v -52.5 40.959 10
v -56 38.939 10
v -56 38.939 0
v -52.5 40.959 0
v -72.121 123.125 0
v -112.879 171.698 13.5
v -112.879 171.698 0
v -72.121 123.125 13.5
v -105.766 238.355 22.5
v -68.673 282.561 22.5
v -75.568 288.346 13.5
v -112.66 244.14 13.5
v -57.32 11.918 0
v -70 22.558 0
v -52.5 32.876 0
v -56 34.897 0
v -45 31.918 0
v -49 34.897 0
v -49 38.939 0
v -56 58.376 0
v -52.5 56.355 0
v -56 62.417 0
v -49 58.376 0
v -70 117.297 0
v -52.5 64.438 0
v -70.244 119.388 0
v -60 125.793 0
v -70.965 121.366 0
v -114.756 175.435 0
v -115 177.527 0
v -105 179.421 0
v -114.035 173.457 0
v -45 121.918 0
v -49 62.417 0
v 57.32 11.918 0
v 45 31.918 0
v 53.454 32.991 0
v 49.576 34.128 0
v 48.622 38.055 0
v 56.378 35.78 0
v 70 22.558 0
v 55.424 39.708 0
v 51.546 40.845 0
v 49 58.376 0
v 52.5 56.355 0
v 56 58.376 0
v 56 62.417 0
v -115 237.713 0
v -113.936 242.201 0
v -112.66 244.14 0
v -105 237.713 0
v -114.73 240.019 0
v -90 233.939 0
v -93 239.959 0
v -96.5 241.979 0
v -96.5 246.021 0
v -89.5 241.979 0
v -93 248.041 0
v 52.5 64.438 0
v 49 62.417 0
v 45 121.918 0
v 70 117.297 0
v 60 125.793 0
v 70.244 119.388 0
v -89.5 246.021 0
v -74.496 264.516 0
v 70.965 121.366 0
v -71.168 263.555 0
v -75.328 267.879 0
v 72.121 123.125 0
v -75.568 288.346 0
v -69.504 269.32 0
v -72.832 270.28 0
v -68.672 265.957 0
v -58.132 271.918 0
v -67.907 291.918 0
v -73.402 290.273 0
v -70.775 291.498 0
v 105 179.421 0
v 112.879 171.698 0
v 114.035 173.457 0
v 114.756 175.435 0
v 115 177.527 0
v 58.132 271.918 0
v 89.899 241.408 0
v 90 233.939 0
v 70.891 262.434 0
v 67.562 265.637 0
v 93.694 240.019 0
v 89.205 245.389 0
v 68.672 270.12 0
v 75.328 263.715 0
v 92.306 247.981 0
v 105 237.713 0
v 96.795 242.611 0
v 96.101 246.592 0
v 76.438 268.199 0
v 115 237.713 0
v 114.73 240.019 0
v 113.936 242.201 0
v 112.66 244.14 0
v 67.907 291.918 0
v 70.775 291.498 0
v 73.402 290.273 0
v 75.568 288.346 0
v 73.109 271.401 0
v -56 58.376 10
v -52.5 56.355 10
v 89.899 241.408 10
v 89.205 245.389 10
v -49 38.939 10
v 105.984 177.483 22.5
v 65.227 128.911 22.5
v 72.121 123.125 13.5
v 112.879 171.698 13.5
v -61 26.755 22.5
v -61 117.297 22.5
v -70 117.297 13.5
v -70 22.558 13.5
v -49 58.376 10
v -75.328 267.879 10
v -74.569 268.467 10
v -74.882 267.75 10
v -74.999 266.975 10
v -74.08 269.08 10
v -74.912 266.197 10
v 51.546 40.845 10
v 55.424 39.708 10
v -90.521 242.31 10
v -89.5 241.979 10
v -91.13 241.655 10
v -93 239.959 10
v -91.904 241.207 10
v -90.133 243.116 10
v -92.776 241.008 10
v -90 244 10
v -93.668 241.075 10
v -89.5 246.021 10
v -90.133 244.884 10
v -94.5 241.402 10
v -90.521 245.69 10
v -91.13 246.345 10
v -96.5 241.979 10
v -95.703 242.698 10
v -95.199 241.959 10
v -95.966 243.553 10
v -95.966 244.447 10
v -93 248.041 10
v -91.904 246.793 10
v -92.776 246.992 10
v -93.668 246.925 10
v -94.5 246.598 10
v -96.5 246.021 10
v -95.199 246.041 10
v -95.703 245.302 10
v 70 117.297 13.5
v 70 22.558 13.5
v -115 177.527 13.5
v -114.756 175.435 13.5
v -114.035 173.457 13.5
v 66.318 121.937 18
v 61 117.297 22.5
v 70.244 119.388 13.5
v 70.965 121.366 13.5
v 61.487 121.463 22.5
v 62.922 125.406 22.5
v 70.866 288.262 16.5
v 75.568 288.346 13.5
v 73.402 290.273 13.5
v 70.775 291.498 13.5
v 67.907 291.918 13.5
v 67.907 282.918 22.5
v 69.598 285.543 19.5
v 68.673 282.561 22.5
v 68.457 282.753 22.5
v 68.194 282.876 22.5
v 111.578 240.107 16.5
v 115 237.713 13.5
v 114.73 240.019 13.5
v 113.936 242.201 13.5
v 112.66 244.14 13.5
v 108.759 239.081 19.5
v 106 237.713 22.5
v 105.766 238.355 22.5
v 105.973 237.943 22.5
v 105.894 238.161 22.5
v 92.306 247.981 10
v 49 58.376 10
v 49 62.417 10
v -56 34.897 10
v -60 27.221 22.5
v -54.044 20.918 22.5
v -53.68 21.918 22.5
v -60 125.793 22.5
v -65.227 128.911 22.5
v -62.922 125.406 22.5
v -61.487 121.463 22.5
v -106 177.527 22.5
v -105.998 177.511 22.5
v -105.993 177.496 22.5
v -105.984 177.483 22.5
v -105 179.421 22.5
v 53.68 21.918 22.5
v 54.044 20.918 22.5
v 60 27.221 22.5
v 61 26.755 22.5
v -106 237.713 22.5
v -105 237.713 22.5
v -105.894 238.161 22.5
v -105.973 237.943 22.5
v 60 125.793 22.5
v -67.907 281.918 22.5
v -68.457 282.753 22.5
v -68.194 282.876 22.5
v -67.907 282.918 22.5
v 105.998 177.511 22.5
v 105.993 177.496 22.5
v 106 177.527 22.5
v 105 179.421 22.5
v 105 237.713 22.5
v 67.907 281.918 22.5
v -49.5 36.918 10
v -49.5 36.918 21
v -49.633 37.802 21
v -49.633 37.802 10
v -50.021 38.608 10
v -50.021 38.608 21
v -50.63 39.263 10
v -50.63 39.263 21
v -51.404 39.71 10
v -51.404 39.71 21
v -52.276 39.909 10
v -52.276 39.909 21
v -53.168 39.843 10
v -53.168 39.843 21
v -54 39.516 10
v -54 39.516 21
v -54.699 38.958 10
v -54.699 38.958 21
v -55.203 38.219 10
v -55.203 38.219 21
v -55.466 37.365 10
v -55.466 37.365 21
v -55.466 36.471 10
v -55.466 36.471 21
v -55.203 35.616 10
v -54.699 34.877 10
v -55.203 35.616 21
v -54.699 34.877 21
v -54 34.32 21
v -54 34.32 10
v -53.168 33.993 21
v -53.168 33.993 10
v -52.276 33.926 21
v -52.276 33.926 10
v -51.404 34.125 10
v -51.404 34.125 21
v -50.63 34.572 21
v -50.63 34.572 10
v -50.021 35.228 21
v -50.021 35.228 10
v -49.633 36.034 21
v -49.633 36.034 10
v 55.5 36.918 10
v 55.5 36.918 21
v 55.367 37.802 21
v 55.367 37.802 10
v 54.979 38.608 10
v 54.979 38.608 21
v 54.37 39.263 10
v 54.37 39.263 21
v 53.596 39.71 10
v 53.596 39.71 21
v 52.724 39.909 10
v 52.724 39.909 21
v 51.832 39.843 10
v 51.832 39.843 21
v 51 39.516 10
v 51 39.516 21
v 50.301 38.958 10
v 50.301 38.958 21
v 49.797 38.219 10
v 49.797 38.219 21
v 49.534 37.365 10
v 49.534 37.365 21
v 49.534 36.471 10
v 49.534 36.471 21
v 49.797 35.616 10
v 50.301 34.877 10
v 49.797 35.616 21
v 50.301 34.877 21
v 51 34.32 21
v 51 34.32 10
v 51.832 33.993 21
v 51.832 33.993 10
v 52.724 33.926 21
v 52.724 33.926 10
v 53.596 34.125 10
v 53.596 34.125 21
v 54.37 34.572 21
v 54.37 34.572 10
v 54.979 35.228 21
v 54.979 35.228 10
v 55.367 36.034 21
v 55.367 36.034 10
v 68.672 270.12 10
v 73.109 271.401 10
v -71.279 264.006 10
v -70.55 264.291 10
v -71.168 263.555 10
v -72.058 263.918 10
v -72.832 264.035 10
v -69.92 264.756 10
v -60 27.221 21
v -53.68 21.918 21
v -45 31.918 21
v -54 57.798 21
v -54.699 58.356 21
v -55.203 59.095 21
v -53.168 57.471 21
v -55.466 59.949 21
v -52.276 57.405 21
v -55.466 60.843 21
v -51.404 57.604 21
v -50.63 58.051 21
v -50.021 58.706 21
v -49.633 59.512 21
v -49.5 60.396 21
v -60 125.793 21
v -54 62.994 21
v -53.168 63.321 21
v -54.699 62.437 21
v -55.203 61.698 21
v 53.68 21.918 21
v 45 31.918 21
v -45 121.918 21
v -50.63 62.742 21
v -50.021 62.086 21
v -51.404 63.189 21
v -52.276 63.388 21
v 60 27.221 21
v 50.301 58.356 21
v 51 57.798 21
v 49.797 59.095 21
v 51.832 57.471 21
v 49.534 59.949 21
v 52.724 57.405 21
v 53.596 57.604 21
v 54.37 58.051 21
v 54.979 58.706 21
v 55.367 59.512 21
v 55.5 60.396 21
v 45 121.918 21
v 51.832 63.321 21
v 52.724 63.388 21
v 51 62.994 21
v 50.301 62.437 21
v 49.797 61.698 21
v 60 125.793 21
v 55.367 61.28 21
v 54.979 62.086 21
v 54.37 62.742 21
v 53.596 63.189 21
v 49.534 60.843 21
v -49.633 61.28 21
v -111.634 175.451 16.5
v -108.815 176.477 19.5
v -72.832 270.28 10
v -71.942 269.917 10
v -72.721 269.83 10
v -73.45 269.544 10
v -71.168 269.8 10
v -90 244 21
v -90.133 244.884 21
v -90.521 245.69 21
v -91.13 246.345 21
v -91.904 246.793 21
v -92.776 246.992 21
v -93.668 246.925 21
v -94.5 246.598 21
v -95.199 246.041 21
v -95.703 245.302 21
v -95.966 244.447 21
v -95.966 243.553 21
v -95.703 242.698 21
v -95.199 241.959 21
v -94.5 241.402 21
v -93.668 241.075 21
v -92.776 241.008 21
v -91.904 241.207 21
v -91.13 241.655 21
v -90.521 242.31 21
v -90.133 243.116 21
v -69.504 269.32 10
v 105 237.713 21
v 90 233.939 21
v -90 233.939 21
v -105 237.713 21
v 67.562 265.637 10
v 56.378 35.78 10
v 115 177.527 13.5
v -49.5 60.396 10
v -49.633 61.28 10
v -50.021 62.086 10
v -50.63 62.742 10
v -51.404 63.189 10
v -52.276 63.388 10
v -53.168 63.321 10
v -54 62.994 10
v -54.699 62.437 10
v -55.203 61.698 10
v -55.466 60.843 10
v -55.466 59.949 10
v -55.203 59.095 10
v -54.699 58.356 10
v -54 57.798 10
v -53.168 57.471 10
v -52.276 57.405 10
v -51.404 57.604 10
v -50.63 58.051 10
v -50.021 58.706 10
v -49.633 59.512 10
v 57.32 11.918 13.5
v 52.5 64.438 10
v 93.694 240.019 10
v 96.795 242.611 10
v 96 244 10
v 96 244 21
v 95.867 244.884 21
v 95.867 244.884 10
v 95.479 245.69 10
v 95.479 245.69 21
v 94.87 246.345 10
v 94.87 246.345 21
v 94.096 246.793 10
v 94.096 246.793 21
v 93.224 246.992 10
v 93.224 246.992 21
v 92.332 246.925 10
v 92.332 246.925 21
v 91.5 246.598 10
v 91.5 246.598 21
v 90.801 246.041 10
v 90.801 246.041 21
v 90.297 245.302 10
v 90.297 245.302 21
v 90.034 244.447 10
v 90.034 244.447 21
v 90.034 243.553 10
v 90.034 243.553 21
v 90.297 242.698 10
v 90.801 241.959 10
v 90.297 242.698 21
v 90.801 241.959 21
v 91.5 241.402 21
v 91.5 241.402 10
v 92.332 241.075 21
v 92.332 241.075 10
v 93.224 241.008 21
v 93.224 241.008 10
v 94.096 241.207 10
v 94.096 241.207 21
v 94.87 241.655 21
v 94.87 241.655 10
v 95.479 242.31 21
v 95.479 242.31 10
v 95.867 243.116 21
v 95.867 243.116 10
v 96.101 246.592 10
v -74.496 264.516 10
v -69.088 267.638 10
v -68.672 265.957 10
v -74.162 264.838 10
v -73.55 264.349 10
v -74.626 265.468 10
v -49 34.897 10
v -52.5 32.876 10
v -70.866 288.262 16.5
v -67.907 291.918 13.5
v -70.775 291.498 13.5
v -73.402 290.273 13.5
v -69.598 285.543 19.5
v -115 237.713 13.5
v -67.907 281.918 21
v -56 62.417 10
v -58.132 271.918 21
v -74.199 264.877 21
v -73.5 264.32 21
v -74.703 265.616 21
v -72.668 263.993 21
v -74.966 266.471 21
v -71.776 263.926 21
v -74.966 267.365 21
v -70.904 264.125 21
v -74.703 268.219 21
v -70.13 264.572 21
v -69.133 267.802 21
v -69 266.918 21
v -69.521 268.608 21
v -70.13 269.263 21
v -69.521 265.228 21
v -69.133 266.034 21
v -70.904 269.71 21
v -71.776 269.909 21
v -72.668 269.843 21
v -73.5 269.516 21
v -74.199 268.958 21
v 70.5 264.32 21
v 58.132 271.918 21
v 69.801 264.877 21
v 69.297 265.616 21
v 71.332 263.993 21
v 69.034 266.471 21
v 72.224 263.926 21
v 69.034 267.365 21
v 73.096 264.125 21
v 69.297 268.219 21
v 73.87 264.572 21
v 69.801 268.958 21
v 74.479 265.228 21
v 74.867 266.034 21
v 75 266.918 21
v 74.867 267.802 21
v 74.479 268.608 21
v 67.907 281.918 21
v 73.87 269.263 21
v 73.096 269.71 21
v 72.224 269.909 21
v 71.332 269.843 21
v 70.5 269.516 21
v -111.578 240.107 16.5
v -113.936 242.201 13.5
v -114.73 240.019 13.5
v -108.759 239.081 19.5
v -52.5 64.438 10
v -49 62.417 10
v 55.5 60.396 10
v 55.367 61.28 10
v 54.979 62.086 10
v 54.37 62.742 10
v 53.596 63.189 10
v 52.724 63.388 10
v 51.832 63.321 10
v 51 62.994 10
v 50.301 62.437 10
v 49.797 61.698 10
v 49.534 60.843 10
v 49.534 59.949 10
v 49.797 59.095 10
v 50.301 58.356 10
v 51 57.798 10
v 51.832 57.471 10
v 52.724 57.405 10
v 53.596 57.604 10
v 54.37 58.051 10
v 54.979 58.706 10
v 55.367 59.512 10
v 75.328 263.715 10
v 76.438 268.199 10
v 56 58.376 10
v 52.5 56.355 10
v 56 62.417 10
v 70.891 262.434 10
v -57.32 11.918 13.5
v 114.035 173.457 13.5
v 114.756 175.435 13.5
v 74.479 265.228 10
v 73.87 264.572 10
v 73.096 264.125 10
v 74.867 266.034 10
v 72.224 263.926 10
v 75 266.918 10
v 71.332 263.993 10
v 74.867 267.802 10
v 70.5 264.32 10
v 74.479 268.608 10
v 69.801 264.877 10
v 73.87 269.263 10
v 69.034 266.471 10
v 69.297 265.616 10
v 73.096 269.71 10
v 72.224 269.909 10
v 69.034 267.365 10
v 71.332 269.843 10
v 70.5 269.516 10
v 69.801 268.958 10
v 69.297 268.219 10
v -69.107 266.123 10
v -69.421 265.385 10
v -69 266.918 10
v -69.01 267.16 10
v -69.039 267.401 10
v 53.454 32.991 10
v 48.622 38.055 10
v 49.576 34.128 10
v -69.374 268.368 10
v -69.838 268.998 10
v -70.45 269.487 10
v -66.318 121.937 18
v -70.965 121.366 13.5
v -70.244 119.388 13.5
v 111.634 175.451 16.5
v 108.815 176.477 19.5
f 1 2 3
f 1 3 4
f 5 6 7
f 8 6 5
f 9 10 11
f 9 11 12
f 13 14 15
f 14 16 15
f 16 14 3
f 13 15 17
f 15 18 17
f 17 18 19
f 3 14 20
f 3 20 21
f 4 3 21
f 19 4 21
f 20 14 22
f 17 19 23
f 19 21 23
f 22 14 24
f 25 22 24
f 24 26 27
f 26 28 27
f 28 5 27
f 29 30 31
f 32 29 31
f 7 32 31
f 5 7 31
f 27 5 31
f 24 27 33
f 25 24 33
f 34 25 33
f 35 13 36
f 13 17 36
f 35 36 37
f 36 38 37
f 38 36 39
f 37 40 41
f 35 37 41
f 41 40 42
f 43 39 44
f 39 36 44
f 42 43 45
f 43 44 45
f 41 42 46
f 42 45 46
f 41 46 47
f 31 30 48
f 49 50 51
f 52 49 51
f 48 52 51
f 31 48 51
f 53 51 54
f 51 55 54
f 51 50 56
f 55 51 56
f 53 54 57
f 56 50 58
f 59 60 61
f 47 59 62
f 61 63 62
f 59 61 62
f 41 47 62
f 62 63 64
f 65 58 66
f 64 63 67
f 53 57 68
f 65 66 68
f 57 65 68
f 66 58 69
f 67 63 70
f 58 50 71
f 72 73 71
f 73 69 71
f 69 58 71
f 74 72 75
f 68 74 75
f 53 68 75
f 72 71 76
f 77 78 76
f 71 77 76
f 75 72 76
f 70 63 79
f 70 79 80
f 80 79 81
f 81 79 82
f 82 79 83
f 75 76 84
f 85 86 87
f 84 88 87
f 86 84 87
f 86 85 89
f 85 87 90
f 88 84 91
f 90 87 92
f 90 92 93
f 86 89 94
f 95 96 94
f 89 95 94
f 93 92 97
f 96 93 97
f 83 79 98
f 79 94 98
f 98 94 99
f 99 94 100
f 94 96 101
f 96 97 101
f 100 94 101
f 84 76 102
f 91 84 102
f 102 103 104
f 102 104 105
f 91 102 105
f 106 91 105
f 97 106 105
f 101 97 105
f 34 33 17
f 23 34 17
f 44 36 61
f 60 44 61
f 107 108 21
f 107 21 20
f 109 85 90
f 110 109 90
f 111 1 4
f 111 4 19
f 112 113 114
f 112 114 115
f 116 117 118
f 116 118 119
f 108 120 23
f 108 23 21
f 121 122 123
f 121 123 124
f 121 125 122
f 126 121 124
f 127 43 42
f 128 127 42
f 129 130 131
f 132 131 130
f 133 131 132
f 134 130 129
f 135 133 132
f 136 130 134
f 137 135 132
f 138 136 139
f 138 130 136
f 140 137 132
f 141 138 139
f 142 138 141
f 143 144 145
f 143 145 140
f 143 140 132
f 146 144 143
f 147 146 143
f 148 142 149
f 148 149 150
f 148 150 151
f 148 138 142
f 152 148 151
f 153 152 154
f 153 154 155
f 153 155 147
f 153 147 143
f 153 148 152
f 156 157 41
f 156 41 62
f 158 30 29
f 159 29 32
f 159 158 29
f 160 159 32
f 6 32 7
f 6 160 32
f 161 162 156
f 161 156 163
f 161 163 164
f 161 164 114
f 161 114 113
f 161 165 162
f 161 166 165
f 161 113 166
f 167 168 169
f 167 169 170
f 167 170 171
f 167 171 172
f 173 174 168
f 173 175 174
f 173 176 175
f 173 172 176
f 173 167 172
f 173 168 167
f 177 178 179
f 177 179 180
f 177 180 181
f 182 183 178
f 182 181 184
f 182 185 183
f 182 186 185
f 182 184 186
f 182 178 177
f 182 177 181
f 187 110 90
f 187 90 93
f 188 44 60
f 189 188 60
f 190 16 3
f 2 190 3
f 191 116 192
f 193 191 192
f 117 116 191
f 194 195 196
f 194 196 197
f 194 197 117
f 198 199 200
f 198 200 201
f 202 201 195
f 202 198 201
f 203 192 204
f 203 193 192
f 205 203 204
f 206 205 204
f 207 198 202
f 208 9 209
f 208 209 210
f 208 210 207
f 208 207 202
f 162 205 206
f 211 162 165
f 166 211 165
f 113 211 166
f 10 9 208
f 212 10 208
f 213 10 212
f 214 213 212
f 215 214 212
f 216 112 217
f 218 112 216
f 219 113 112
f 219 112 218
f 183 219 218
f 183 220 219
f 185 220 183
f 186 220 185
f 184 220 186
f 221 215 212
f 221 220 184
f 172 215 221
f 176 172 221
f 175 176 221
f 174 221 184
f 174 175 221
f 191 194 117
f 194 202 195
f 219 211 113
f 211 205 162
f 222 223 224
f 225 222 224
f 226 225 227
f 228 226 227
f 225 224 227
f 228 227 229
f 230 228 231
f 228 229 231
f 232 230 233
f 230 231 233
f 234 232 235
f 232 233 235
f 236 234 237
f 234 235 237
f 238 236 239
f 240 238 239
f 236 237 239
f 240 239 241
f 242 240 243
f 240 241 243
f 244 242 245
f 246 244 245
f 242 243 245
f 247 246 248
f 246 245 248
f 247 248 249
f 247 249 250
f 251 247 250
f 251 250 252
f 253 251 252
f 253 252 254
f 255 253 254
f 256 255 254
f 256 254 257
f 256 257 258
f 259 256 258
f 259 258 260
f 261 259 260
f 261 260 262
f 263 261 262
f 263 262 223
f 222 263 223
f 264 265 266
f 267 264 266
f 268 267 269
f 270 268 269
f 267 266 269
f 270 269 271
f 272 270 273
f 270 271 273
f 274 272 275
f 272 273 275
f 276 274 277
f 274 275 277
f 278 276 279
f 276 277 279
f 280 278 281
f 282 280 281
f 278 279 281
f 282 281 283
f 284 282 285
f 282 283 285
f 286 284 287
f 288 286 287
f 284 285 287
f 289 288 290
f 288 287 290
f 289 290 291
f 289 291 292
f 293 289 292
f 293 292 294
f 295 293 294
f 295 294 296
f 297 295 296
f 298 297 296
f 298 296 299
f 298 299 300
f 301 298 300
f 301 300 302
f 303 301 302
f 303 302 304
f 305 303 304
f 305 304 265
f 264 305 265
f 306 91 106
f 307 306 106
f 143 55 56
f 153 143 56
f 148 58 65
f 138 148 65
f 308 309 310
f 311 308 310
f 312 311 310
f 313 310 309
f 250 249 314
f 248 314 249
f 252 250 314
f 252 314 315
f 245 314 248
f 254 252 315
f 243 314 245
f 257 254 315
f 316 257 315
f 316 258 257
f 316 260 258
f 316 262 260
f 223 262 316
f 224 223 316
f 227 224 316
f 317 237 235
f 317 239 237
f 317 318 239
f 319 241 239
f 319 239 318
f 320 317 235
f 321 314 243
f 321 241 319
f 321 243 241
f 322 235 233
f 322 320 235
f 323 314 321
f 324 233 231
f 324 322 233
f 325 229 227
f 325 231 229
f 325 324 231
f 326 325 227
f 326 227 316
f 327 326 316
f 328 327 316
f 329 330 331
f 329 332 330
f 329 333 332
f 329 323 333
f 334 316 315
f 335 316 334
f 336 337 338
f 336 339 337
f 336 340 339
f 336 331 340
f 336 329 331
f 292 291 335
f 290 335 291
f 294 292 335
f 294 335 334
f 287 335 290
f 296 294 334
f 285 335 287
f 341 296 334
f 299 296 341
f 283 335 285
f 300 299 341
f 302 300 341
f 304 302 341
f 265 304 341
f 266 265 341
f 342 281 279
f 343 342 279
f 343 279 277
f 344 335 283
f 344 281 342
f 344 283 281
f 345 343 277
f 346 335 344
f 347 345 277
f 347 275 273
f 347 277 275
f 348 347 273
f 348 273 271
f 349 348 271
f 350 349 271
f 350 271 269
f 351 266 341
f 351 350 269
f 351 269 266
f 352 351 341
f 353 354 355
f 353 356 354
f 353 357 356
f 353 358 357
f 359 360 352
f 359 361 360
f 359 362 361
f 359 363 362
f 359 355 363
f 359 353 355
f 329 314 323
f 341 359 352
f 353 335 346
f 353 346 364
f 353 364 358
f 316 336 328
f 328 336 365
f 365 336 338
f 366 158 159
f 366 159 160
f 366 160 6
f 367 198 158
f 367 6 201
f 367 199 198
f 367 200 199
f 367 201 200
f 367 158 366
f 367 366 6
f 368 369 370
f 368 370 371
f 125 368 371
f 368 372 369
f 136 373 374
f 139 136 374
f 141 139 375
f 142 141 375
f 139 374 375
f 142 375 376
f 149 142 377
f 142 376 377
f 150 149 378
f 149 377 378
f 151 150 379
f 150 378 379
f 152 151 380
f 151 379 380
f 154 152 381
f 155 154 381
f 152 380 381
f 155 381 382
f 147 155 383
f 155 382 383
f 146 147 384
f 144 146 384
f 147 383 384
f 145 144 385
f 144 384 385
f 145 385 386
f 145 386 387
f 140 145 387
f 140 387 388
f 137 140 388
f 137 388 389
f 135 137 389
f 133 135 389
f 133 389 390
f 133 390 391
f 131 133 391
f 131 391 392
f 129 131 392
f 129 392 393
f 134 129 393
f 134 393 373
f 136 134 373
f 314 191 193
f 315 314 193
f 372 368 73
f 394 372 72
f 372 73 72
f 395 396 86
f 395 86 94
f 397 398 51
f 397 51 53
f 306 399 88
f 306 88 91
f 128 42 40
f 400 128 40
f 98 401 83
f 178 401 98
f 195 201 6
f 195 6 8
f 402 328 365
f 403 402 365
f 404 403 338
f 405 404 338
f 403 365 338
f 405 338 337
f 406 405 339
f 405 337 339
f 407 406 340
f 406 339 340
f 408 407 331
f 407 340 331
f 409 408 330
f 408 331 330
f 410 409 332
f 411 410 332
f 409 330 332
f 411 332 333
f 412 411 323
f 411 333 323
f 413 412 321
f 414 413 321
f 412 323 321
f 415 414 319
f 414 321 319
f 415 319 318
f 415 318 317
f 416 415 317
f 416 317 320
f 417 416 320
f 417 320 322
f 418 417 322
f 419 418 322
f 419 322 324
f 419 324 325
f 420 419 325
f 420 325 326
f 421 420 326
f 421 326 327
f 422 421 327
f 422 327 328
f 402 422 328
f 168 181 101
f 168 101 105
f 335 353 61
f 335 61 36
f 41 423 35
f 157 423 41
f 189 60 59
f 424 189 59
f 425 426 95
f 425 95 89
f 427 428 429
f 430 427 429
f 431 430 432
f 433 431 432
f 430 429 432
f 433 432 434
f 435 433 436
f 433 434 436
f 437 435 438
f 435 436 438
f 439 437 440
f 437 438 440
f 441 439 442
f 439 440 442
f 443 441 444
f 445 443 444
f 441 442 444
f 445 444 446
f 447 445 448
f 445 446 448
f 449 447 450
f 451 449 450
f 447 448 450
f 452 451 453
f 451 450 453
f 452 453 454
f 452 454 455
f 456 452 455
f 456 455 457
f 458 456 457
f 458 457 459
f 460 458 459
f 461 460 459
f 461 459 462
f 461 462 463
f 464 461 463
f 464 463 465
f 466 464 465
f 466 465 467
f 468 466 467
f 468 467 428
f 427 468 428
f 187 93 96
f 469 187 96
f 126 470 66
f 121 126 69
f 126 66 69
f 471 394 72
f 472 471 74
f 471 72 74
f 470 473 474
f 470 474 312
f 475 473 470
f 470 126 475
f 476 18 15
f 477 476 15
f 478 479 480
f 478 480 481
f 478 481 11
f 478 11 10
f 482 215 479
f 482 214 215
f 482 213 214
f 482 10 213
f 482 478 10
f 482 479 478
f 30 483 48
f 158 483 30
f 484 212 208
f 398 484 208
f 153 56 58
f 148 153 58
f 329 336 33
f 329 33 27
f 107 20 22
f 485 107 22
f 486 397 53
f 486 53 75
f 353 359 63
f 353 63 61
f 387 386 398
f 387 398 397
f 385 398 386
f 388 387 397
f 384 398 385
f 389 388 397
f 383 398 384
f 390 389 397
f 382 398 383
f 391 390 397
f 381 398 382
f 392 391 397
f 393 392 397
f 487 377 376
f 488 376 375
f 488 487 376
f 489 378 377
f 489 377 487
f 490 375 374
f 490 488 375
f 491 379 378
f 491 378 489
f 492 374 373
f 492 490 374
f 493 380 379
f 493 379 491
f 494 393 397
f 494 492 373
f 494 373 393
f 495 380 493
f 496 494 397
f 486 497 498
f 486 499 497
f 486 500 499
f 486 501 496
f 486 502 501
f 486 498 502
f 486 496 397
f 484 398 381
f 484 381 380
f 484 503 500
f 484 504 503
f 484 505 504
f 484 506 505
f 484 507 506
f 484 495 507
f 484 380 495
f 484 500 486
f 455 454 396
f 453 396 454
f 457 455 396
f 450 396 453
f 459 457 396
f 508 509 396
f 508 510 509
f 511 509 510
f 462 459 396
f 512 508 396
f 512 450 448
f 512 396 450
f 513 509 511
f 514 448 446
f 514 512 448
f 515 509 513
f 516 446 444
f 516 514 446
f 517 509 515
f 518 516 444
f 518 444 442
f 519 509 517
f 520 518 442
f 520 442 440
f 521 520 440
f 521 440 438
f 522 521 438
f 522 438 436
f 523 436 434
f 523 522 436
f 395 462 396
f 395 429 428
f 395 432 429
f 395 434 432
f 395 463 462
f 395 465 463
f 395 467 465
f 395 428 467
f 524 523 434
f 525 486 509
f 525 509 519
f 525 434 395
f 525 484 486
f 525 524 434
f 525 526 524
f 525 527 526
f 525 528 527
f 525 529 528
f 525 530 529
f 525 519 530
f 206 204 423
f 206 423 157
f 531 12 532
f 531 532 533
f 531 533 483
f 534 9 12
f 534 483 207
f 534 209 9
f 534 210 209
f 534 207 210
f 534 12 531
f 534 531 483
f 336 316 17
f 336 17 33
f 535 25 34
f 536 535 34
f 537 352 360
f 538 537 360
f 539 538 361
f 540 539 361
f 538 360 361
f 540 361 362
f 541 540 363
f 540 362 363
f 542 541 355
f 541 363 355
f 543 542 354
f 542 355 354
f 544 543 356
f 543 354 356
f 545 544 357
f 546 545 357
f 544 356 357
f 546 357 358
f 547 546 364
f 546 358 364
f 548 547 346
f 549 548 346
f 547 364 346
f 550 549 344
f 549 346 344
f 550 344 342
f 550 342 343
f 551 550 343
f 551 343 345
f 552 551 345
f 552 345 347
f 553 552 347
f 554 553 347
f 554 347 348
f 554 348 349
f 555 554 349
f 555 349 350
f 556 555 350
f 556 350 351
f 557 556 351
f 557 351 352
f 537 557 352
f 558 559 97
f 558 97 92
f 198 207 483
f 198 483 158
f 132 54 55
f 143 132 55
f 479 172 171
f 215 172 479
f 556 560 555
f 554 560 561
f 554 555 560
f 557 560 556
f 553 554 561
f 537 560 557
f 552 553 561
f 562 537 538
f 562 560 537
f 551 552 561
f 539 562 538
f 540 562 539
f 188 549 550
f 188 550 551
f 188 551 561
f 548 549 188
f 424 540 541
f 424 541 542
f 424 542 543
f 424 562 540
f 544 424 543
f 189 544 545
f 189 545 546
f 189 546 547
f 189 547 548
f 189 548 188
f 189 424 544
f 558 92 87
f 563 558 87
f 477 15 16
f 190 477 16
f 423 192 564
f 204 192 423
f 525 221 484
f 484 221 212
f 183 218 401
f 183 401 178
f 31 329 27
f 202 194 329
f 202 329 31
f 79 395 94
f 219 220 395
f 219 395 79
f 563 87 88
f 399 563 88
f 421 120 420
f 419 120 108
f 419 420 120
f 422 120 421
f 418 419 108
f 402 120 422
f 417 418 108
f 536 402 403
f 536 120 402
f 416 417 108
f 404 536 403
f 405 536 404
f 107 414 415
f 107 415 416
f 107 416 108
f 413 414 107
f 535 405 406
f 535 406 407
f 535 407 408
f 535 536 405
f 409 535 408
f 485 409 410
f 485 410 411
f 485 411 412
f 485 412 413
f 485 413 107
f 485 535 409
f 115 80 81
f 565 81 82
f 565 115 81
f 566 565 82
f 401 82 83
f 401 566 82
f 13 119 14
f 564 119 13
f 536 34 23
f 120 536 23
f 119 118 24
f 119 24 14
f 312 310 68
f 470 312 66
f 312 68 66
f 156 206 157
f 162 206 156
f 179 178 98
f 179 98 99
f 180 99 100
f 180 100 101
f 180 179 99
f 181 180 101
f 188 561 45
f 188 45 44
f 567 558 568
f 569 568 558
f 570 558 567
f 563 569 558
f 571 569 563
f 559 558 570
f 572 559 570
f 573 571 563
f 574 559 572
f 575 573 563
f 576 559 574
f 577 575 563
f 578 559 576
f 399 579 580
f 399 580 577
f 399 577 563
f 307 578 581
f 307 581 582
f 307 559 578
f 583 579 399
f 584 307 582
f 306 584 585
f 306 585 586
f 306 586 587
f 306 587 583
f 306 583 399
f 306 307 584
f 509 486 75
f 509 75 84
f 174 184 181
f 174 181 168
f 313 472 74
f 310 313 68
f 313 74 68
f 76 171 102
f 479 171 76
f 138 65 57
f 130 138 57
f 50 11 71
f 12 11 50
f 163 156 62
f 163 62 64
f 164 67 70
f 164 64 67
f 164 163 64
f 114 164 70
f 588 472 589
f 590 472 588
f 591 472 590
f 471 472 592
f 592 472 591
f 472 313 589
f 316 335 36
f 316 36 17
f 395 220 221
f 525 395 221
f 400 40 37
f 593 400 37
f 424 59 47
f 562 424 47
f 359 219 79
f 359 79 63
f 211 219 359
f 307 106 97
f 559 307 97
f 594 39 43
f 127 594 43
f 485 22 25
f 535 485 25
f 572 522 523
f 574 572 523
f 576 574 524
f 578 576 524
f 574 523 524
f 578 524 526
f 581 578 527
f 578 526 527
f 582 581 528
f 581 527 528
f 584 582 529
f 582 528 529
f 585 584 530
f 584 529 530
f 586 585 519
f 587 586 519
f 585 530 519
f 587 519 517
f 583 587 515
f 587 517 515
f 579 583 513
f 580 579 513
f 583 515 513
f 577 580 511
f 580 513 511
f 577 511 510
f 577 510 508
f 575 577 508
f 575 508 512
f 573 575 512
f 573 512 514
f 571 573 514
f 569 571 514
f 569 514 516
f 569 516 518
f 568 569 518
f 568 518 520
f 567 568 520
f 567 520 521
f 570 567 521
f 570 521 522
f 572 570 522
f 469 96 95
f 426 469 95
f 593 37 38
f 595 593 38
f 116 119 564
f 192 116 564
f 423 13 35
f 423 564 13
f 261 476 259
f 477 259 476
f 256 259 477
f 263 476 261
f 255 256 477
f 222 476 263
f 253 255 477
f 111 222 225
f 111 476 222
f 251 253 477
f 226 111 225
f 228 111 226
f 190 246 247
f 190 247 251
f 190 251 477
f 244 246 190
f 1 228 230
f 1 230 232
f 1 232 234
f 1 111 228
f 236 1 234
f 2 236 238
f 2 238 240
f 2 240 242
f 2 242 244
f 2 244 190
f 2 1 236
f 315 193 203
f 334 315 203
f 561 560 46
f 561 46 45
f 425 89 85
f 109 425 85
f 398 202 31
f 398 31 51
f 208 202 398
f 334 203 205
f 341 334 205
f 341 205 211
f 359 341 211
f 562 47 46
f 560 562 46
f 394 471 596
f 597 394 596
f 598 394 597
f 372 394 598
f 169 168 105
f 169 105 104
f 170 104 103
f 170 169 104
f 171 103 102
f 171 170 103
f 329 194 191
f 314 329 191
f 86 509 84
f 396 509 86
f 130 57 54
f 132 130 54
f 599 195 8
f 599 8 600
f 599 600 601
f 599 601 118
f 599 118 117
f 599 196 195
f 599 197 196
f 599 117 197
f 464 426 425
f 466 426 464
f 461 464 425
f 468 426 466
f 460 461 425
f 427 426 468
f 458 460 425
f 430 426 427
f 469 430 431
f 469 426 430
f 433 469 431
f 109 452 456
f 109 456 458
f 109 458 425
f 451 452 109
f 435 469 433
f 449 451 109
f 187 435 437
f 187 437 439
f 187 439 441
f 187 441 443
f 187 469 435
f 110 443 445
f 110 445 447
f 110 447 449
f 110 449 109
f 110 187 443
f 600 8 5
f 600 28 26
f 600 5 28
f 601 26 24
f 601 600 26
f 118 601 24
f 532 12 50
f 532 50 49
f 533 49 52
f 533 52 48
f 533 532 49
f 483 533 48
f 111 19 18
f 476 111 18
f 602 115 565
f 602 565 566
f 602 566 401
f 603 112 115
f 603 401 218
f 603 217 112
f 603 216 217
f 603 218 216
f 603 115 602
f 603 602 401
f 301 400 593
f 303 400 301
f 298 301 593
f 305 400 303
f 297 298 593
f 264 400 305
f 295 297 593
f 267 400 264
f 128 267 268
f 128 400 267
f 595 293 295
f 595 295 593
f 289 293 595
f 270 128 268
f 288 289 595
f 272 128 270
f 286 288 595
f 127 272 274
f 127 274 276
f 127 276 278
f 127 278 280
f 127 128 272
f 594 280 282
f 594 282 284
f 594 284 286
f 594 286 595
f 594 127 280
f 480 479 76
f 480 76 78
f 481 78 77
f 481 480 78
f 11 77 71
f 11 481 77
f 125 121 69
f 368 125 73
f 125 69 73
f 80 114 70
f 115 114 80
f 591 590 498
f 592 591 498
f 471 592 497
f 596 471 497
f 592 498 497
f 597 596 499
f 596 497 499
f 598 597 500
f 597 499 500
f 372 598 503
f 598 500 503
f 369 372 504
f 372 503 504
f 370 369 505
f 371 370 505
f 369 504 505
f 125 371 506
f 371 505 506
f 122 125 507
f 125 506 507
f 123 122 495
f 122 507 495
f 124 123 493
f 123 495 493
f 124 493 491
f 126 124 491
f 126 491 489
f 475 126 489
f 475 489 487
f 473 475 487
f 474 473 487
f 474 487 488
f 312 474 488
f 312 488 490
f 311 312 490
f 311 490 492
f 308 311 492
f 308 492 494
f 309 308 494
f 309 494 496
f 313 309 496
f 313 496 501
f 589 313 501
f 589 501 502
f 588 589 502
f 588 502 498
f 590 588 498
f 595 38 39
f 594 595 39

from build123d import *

# Parameters (mm, degrees)
RESSALTO_EXTRUS_O1_DEPTH = 22.5
CHANFRO1_SIZE            = 9
CORTE_EXTRUS_O1_REACH    = 24.5
ESBO_O3_W                = 1139.230904301
ESBO_O3_H                = 709.798033895
CORTE_EXTRUS_O5_DEPTH    = 1.5
ESBO_O5_R                = 3
CORTE_EXTRUS_O6_DEPTH    = 22
CORTE_EXTRUS_O8_DEPTH    = 10
CORTE_EXTRUS_O9_DEPTH    = 22


with BuildPart() as part:
    # Esboço1 → Ressalto-extrusão1 (new body, symmetric)
    with BuildSketch(Plane.XY):
        with BuildLine():
            Line((-57.319579452, 11.917784657), (57.319579452, 11.917784657))
            Line((57.319579452, 11.917784657), (70, 22.557920862))
            Line((70, 22.557920862), (70, 117.296691049))
            ThreePointArc((70, 117.296691049), (70.546863139, 120.39810603), (72.121492792, 123.125444592))
            Line((72.121492792, 123.125444592), (112.878507208, 171.697762944))
            ThreePointArc((112.878507208, 171.697762944), (114.453136861, 174.425101506), (115, 177.526516487))
            Line((115, 177.526516487), (115, 237.712528581))
            ThreePointArc((115, 237.712528581), (114.396926208, 241.132730014), (112.660444431, 244.140404678))
            Line((112.660444431, 244.140404678), (75.567830361, 288.345660754))
            ThreePointArc((75.567830361, 288.345660754), (72.133568548, 290.980862527), (67.90738593, 291.917784657))
            Line((67.90738593, 291.917784657), (-67.90738593, 291.917784657))
            ThreePointArc((-67.90738593, 291.917784657), (-72.133568548, 290.980862527), (-75.567830361, 288.345660754))
            Line((-75.567830361, 288.345660754), (-112.660444431, 244.140404678))
            ThreePointArc((-112.660444431, 244.140404678), (-114.396926208, 241.132730014), (-115, 237.712528581))
            Line((-115, 237.712528581), (-115, 177.526516487))
            ThreePointArc((-115, 177.526516487), (-114.453136861, 174.425101506), (-112.878507208, 171.697762944))
            Line((-112.878507208, 171.697762944), (-72.121492792, 123.125444592))
            ThreePointArc((-72.121492792, 123.125444592), (-70.546863139, 120.39810603), (-70, 117.296691049))
            Line((-70, 117.296691049), (-70, 22.557920862))
            Line((-70, 22.557920862), (-57.319579452, 11.917784657))
        make_face()
        Polygon((-90, 175.546696324), (-90, 233.938676426), (-58.131744291, 271.917784657), (58.131744291, 271.917784657), (90, 233.938676426), (90, 175.546696324), (45, 121.917784657), (45, 31.917784657), (-45, 31.917784657), (-45, 121.917784657), align=None, mode=Mode.SUBTRACT)
    extrude(amount=RESSALTO_EXTRUS_O1_DEPTH, both=True)

    # Chanfro1
    chanfro1_edges = [part.edges().sort_by_distance(p)[0] for p in [
        (70, 69.927305955, 22.5),
        (70.546863139, 120.39810603, 22.5),
        (92.5, 147.411603768, 22.5),
        (114.453136861, 174.425101506, 22.5),
        (115, 207.619522534, 22.5),
        (114.396926208, 241.132730014, 22.5),
        (94.114137396, 266.243032716, 22.5),
        (72.133568548, 290.980862527, 22.5),
        (0, 291.917784657, 22.5),
        (-72.133568548, 290.980862527, 22.5),
        (-94.114137396, 266.243032716, 22.5),
        (-114.396926208, 241.132730014, 22.5),
        (-115, 207.619522534, 22.5),
        (-114.453136861, 174.425101506, 22.5),
        (-92.5, 147.411603768, 22.5),
        (-70.546863139, 120.39810603, 22.5),
        (-70, 69.927305955, 22.5),
        (-63.659789726, 17.23785276, 22.5),
        (0, 11.917784657, 22.5),
        (63.659789726, 17.23785276, 22.5),
    ]]
    chamfer(chanfro1_edges, length=CHANFRO1_SIZE)

    # Esboço3 → Corte-extrusão1 (cut, up to next)
    with BuildSketch(Plane.XY, mode=Mode.PRIVATE) as corte_extrus_o1_sk1:
        with Locations((-153.157436203, 152.53565808)):
            Rectangle(ESBO_O3_W, ESBO_O3_H)
    corte_extrus_o1_tool1 = extrude(corte_extrus_o1_sk1.sketch, amount=-CORTE_EXTRUS_O1_REACH, mode=Mode.PRIVATE) & part.part
    add(corte_extrus_o1_tool1.solids().sort_by_distance((-153.157436, 152.535658, 0))[0], mode=Mode.SUBTRACT)

    # Esboço4 → Corte-extrusão5 (cut)
    with BuildSketch(Plane.XY.offset(22.5)):
        Polygon((-60, 27.220997444), (-53.679877109, 21.917784657), (53.679877109, 21.917784657), (60, 27.220997444), (60, 125.792574104), (105, 179.421485771), (105, 237.712528581), (67.90738593, 281.917784657), (-67.90738593, 281.917784657), (-105, 237.712528581), (-105, 179.421485771), (-60, 125.792574104), align=None)
        Polygon((-90, 175.546696324), (-90, 233.938676426), (-58.131744291, 271.917784657), (58.131744291, 271.917784657), (90, 233.938676426), (90, 175.546696324), (45, 121.917784657), (45, 31.917784657), (-45, 31.917784657), (-45, 121.917784657), align=None, mode=Mode.SUBTRACT)
    extrude(amount=-CORTE_EXTRUS_O5_DEPTH, mode=Mode.SUBTRACT)

    # Esboço5 → Corte-extrusão6 (cut, through all)
    with BuildSketch(Plane.XY.offset(21)):
        with Locations((-93, 244)):
            Circle(ESBO_O5_R)
        with Locations((-52.5, 60.396230411)):
            Circle(ESBO_O5_R)
        with Locations((-72, 266.917784657)):
            Circle(ESBO_O5_R)
        with Locations((-52.5, 36.917784657)):
            Circle(ESBO_O5_R)
        with Locations((52.5, 36.917784657)):
            Circle(ESBO_O5_R)
        with Locations((72, 266.917784657)):
            Circle(ESBO_O5_R)
        with Locations((52.5, 60.396230411)):
            Circle(ESBO_O5_R)
        with Locations((93, 244)):
            Circle(ESBO_O5_R)
    extrude(amount=-CORTE_EXTRUS_O6_DEPTH, mode=Mode.SUBTRACT)

    # Esboço7 → Corte-extrusão8 (cut)
    with BuildSketch(Plane(origin=(0, 0, 0), x_dir=(-1, 0, 0), z_dir=(0, 0, -1))):
        Polygon((-73.109400392, 271.401372964), (-76.43760157, 268.198809887), (-75.328201177, 263.715221581), (-70.890599608, 262.434196351), (-67.56239843, 265.636759427), (-68.671798823, 270.120347733), align=None)
        Polygon((-92.305785489, 247.981381613), (-96.100870363, 246.591898209), (-96.795084874, 242.610516596), (-93.694214511, 240.018618387), (-89.899129637, 241.408101791), (-89.204915126, 245.389483404), align=None)
        Polygon((93, 248.041451884), (89.5, 246.020725942), (89.5, 241.979274058), (93, 239.958548116), (96.5, 241.979274058), (96.5, 246.020725942), align=None)
        Polygon((72.832050294, 270.280475887), (69.503849117, 269.319706964), (68.671798823, 265.957015734), (71.167949706, 263.555093427), (74.496150883, 264.51586235), (75.328201177, 267.87855358), align=None)
        Polygon((-52.5, 64.437682295), (-56, 62.416956353), (-56, 58.375504468), (-52.5, 56.354778526), (-49, 58.375504468), (-49, 62.416956353), align=None)
        Polygon((52.5, 64.437682295), (49, 62.416956353), (49, 58.375504468), (52.5, 56.354778526), (56, 58.375504468), (56, 62.416956353), align=None)
        Polygon((52.5, 40.959236541), (49, 38.938510599), (49, 34.897058715), (52.5, 32.876332773), (56, 34.897058715), (56, 38.938510599), align=None)
        Polygon((-51.54604516, 40.845036049), (-55.424122052, 39.707559479), (-56.378076893, 35.780308087), (-53.45395484, 32.990533265), (-49.575877948, 34.128009835), (-48.621923107, 38.055261227), align=None)
    extrude(amount=-CORTE_EXTRUS_O8_DEPTH, mode=Mode.SUBTRACT)

    # Esboço8 → Corte-extrusão9 (cut, through all)
    with BuildSketch(Plane.XY.offset(21)):
        Polygon((-105, 237.712528581), (-90, 233.938676426), (-90, 175.546696324), (-45, 121.917784657), (-60, 125.792574104), (-105, 179.421485771), align=None)
        Polygon((90, 233.938676426), (105, 237.712528581), (105, 179.421485771), (60, 125.792574104), (45, 121.917784657), (90, 175.546696324), align=None)
    extrude(amount=-CORTE_EXTRUS_O9_DEPTH, mode=Mode.SUBTRACT)


solid = part.part
